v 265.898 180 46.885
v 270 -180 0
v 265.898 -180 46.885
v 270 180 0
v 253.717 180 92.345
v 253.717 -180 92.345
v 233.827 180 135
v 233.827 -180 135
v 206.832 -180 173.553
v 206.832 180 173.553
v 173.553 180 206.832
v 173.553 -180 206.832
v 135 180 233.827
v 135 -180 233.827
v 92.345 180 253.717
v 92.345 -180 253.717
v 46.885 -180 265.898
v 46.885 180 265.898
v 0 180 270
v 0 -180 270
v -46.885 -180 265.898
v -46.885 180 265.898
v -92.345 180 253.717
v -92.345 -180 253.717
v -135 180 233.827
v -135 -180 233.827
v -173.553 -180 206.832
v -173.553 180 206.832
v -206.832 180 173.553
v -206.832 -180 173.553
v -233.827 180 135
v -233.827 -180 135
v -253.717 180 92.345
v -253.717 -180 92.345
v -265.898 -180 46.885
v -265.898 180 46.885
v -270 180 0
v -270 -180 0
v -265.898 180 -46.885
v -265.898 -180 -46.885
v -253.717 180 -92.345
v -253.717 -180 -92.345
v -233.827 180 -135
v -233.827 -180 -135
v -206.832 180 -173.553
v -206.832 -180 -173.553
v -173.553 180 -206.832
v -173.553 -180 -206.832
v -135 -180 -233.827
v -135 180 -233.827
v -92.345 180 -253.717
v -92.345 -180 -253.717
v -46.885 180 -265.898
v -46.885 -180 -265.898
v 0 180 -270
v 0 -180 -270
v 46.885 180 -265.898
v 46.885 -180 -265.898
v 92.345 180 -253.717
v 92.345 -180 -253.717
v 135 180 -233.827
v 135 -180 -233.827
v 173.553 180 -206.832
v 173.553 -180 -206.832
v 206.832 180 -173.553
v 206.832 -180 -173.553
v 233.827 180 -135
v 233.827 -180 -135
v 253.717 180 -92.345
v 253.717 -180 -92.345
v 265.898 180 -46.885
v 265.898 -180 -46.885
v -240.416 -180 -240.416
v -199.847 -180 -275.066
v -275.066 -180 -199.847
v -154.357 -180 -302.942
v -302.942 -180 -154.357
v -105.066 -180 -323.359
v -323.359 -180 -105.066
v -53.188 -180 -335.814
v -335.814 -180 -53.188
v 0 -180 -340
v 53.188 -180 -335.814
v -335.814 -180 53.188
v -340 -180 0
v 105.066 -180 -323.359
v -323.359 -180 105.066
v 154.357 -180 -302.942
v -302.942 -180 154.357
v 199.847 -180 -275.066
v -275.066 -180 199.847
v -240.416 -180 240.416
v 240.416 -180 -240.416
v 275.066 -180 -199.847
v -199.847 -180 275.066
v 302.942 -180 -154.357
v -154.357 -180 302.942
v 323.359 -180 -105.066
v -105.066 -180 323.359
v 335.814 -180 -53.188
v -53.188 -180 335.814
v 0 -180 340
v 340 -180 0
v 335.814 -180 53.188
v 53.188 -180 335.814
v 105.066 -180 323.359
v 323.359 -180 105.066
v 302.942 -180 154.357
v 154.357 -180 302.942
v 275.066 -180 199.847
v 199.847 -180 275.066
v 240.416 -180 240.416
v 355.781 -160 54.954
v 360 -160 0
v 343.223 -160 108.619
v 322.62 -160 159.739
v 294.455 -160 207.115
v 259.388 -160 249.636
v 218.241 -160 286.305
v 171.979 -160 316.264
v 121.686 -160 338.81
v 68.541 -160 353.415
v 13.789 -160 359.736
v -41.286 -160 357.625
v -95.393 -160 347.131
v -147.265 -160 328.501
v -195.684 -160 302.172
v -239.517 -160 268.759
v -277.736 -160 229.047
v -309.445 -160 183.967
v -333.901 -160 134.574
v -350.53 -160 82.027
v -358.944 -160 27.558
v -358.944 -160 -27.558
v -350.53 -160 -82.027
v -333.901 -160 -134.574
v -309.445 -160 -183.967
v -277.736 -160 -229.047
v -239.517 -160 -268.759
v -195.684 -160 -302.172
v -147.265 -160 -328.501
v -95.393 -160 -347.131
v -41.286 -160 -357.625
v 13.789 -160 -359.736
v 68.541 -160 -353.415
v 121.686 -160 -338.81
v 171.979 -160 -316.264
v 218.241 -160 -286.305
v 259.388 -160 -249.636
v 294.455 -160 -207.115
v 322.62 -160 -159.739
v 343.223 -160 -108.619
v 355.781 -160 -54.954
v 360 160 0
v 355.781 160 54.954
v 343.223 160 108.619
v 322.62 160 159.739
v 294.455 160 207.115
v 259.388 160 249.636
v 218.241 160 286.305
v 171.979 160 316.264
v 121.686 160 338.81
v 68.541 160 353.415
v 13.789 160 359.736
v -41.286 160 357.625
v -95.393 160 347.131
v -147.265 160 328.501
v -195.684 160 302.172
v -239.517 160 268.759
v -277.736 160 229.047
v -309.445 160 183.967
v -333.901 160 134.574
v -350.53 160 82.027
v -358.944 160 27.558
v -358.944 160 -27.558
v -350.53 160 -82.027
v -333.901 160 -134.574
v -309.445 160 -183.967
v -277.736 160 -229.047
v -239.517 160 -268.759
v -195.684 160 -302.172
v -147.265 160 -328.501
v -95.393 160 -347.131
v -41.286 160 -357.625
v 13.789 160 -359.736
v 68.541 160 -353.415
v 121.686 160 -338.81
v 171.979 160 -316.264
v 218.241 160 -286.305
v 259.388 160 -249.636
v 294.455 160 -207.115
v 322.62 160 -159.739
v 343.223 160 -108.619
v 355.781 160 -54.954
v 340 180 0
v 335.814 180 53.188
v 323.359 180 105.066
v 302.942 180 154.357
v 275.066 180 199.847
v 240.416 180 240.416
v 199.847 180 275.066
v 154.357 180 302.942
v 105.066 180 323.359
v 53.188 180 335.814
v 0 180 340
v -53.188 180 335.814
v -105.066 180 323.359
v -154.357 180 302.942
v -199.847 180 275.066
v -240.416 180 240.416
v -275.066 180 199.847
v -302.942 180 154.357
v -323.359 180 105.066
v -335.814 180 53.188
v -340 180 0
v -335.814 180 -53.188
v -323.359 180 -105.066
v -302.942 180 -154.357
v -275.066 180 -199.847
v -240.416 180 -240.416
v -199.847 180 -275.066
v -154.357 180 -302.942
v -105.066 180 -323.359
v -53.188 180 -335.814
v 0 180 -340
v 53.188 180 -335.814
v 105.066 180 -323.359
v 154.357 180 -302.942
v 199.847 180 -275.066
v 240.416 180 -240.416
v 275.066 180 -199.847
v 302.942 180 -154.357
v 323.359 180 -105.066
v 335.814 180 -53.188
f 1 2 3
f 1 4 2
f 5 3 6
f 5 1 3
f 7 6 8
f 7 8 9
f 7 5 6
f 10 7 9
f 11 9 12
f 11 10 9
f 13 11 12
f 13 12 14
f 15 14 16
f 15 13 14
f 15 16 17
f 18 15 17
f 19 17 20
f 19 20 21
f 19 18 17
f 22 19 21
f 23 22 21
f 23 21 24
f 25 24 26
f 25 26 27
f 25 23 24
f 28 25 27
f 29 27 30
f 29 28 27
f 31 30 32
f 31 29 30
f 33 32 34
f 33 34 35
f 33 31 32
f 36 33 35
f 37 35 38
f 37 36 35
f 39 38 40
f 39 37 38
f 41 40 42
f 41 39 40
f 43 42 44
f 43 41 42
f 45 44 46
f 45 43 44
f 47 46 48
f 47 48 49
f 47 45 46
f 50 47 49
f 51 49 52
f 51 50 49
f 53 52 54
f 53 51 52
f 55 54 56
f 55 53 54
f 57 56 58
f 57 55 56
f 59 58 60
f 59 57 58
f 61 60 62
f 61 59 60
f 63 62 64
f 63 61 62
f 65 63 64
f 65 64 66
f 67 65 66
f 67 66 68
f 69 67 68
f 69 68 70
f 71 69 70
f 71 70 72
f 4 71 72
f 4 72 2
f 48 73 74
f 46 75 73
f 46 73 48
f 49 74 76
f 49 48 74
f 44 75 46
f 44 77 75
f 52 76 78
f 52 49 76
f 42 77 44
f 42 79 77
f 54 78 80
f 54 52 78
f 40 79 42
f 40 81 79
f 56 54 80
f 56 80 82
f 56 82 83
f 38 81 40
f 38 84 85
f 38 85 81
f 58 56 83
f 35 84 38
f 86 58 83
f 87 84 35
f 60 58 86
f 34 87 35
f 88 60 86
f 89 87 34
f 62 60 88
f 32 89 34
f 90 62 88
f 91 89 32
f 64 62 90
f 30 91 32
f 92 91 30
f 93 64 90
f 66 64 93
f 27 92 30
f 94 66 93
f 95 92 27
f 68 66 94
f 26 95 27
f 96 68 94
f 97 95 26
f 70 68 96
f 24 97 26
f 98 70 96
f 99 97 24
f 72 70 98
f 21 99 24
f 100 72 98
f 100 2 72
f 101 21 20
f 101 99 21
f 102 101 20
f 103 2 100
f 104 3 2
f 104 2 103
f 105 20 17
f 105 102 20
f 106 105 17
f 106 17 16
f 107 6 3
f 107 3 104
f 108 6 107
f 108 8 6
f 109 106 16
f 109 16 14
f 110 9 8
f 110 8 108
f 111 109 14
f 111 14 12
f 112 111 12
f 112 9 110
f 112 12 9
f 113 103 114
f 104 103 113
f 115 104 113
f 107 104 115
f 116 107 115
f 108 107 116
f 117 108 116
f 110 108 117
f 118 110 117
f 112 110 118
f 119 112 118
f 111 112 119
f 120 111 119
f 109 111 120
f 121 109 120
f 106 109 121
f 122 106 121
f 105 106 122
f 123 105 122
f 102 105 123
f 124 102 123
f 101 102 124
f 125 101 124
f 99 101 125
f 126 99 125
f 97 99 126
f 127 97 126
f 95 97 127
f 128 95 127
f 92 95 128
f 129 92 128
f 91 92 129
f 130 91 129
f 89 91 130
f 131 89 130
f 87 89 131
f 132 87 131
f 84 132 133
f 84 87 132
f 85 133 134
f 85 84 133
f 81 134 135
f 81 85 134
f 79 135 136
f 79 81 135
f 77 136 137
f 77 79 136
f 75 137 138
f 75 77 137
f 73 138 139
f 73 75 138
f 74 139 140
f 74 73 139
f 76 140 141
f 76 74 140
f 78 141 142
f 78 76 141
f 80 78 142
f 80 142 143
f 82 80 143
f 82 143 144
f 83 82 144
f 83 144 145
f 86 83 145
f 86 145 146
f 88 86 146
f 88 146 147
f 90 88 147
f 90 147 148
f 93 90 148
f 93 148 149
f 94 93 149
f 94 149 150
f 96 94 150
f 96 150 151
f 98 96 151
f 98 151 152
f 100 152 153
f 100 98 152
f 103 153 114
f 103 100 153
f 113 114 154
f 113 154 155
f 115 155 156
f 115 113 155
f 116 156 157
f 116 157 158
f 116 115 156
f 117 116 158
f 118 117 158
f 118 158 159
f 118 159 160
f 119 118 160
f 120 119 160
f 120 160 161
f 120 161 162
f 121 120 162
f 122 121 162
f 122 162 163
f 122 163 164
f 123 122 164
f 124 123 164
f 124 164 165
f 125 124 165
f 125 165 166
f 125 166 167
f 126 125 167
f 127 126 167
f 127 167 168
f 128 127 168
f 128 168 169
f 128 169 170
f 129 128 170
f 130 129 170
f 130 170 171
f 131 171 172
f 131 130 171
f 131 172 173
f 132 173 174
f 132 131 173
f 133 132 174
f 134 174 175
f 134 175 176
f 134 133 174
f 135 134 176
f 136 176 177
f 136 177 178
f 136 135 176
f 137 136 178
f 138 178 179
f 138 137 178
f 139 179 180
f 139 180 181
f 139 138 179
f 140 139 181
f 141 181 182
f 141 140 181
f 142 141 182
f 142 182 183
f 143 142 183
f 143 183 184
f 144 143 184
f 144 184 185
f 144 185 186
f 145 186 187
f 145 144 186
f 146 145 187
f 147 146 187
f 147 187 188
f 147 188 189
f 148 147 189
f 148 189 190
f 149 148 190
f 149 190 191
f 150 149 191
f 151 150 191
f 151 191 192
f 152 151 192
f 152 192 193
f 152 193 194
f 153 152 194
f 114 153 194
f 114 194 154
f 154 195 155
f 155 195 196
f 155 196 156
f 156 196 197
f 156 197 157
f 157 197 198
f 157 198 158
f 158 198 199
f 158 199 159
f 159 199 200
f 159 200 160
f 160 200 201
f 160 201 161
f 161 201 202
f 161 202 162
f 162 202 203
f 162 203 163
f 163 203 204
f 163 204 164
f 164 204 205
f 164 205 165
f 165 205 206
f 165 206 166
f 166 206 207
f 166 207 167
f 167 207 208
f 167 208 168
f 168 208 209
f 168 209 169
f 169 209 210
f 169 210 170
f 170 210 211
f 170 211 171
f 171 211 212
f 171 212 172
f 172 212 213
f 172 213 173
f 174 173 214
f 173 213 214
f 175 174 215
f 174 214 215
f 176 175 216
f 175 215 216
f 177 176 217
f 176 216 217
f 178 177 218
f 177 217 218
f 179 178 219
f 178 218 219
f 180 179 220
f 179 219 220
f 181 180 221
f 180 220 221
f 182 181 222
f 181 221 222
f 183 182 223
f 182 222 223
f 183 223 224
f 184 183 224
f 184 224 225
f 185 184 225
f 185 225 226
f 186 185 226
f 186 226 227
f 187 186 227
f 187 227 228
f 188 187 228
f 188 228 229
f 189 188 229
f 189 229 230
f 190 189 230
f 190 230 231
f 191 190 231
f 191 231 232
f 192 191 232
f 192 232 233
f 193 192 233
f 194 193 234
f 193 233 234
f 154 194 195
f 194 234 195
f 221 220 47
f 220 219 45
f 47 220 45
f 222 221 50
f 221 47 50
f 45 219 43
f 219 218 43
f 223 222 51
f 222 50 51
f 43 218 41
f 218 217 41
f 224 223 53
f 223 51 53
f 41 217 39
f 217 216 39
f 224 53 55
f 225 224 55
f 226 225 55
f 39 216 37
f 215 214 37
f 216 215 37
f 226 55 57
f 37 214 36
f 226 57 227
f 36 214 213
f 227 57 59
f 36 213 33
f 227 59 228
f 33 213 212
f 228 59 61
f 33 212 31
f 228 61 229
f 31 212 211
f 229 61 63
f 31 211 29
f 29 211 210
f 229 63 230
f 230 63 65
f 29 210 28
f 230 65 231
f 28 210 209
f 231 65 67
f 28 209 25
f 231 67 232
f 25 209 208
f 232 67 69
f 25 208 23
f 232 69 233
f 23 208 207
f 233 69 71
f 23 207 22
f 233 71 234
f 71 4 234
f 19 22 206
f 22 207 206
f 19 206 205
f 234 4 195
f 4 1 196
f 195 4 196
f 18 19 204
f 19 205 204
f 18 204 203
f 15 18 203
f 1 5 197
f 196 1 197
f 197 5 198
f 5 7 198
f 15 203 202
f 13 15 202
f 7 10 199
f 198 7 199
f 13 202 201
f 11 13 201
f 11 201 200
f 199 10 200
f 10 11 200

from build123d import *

# Parameters (mm, degrees)
F0_R     = 360
F0_R_2   = 270
F1_DEPTH = 180
F2_SIZE  = 20
F3_SIZE  = 20


with BuildPart() as f1:
    # F0 (on Front) → F1 (new body, symmetric)
    with BuildSketch(Plane.XZ):
        Circle(F0_R)
        Circle(F0_R_2, mode=Mode.SUBTRACT)
    extrude(amount=F1_DEPTH, both=True)

    # F2
    f2_edges = [f1.edges().sort_by_distance(p)[0] for p in [
        (-360, -180, 0),
    ]]
    chamfer(f2_edges, length=F2_SIZE)

    # F3
    f3_edges = [f1.edges().sort_by_distance(p)[0] for p in [
        (-360, 180, 0),
    ]]
    chamfer(f3_edges, length=F3_SIZE)


solid = f1.part
